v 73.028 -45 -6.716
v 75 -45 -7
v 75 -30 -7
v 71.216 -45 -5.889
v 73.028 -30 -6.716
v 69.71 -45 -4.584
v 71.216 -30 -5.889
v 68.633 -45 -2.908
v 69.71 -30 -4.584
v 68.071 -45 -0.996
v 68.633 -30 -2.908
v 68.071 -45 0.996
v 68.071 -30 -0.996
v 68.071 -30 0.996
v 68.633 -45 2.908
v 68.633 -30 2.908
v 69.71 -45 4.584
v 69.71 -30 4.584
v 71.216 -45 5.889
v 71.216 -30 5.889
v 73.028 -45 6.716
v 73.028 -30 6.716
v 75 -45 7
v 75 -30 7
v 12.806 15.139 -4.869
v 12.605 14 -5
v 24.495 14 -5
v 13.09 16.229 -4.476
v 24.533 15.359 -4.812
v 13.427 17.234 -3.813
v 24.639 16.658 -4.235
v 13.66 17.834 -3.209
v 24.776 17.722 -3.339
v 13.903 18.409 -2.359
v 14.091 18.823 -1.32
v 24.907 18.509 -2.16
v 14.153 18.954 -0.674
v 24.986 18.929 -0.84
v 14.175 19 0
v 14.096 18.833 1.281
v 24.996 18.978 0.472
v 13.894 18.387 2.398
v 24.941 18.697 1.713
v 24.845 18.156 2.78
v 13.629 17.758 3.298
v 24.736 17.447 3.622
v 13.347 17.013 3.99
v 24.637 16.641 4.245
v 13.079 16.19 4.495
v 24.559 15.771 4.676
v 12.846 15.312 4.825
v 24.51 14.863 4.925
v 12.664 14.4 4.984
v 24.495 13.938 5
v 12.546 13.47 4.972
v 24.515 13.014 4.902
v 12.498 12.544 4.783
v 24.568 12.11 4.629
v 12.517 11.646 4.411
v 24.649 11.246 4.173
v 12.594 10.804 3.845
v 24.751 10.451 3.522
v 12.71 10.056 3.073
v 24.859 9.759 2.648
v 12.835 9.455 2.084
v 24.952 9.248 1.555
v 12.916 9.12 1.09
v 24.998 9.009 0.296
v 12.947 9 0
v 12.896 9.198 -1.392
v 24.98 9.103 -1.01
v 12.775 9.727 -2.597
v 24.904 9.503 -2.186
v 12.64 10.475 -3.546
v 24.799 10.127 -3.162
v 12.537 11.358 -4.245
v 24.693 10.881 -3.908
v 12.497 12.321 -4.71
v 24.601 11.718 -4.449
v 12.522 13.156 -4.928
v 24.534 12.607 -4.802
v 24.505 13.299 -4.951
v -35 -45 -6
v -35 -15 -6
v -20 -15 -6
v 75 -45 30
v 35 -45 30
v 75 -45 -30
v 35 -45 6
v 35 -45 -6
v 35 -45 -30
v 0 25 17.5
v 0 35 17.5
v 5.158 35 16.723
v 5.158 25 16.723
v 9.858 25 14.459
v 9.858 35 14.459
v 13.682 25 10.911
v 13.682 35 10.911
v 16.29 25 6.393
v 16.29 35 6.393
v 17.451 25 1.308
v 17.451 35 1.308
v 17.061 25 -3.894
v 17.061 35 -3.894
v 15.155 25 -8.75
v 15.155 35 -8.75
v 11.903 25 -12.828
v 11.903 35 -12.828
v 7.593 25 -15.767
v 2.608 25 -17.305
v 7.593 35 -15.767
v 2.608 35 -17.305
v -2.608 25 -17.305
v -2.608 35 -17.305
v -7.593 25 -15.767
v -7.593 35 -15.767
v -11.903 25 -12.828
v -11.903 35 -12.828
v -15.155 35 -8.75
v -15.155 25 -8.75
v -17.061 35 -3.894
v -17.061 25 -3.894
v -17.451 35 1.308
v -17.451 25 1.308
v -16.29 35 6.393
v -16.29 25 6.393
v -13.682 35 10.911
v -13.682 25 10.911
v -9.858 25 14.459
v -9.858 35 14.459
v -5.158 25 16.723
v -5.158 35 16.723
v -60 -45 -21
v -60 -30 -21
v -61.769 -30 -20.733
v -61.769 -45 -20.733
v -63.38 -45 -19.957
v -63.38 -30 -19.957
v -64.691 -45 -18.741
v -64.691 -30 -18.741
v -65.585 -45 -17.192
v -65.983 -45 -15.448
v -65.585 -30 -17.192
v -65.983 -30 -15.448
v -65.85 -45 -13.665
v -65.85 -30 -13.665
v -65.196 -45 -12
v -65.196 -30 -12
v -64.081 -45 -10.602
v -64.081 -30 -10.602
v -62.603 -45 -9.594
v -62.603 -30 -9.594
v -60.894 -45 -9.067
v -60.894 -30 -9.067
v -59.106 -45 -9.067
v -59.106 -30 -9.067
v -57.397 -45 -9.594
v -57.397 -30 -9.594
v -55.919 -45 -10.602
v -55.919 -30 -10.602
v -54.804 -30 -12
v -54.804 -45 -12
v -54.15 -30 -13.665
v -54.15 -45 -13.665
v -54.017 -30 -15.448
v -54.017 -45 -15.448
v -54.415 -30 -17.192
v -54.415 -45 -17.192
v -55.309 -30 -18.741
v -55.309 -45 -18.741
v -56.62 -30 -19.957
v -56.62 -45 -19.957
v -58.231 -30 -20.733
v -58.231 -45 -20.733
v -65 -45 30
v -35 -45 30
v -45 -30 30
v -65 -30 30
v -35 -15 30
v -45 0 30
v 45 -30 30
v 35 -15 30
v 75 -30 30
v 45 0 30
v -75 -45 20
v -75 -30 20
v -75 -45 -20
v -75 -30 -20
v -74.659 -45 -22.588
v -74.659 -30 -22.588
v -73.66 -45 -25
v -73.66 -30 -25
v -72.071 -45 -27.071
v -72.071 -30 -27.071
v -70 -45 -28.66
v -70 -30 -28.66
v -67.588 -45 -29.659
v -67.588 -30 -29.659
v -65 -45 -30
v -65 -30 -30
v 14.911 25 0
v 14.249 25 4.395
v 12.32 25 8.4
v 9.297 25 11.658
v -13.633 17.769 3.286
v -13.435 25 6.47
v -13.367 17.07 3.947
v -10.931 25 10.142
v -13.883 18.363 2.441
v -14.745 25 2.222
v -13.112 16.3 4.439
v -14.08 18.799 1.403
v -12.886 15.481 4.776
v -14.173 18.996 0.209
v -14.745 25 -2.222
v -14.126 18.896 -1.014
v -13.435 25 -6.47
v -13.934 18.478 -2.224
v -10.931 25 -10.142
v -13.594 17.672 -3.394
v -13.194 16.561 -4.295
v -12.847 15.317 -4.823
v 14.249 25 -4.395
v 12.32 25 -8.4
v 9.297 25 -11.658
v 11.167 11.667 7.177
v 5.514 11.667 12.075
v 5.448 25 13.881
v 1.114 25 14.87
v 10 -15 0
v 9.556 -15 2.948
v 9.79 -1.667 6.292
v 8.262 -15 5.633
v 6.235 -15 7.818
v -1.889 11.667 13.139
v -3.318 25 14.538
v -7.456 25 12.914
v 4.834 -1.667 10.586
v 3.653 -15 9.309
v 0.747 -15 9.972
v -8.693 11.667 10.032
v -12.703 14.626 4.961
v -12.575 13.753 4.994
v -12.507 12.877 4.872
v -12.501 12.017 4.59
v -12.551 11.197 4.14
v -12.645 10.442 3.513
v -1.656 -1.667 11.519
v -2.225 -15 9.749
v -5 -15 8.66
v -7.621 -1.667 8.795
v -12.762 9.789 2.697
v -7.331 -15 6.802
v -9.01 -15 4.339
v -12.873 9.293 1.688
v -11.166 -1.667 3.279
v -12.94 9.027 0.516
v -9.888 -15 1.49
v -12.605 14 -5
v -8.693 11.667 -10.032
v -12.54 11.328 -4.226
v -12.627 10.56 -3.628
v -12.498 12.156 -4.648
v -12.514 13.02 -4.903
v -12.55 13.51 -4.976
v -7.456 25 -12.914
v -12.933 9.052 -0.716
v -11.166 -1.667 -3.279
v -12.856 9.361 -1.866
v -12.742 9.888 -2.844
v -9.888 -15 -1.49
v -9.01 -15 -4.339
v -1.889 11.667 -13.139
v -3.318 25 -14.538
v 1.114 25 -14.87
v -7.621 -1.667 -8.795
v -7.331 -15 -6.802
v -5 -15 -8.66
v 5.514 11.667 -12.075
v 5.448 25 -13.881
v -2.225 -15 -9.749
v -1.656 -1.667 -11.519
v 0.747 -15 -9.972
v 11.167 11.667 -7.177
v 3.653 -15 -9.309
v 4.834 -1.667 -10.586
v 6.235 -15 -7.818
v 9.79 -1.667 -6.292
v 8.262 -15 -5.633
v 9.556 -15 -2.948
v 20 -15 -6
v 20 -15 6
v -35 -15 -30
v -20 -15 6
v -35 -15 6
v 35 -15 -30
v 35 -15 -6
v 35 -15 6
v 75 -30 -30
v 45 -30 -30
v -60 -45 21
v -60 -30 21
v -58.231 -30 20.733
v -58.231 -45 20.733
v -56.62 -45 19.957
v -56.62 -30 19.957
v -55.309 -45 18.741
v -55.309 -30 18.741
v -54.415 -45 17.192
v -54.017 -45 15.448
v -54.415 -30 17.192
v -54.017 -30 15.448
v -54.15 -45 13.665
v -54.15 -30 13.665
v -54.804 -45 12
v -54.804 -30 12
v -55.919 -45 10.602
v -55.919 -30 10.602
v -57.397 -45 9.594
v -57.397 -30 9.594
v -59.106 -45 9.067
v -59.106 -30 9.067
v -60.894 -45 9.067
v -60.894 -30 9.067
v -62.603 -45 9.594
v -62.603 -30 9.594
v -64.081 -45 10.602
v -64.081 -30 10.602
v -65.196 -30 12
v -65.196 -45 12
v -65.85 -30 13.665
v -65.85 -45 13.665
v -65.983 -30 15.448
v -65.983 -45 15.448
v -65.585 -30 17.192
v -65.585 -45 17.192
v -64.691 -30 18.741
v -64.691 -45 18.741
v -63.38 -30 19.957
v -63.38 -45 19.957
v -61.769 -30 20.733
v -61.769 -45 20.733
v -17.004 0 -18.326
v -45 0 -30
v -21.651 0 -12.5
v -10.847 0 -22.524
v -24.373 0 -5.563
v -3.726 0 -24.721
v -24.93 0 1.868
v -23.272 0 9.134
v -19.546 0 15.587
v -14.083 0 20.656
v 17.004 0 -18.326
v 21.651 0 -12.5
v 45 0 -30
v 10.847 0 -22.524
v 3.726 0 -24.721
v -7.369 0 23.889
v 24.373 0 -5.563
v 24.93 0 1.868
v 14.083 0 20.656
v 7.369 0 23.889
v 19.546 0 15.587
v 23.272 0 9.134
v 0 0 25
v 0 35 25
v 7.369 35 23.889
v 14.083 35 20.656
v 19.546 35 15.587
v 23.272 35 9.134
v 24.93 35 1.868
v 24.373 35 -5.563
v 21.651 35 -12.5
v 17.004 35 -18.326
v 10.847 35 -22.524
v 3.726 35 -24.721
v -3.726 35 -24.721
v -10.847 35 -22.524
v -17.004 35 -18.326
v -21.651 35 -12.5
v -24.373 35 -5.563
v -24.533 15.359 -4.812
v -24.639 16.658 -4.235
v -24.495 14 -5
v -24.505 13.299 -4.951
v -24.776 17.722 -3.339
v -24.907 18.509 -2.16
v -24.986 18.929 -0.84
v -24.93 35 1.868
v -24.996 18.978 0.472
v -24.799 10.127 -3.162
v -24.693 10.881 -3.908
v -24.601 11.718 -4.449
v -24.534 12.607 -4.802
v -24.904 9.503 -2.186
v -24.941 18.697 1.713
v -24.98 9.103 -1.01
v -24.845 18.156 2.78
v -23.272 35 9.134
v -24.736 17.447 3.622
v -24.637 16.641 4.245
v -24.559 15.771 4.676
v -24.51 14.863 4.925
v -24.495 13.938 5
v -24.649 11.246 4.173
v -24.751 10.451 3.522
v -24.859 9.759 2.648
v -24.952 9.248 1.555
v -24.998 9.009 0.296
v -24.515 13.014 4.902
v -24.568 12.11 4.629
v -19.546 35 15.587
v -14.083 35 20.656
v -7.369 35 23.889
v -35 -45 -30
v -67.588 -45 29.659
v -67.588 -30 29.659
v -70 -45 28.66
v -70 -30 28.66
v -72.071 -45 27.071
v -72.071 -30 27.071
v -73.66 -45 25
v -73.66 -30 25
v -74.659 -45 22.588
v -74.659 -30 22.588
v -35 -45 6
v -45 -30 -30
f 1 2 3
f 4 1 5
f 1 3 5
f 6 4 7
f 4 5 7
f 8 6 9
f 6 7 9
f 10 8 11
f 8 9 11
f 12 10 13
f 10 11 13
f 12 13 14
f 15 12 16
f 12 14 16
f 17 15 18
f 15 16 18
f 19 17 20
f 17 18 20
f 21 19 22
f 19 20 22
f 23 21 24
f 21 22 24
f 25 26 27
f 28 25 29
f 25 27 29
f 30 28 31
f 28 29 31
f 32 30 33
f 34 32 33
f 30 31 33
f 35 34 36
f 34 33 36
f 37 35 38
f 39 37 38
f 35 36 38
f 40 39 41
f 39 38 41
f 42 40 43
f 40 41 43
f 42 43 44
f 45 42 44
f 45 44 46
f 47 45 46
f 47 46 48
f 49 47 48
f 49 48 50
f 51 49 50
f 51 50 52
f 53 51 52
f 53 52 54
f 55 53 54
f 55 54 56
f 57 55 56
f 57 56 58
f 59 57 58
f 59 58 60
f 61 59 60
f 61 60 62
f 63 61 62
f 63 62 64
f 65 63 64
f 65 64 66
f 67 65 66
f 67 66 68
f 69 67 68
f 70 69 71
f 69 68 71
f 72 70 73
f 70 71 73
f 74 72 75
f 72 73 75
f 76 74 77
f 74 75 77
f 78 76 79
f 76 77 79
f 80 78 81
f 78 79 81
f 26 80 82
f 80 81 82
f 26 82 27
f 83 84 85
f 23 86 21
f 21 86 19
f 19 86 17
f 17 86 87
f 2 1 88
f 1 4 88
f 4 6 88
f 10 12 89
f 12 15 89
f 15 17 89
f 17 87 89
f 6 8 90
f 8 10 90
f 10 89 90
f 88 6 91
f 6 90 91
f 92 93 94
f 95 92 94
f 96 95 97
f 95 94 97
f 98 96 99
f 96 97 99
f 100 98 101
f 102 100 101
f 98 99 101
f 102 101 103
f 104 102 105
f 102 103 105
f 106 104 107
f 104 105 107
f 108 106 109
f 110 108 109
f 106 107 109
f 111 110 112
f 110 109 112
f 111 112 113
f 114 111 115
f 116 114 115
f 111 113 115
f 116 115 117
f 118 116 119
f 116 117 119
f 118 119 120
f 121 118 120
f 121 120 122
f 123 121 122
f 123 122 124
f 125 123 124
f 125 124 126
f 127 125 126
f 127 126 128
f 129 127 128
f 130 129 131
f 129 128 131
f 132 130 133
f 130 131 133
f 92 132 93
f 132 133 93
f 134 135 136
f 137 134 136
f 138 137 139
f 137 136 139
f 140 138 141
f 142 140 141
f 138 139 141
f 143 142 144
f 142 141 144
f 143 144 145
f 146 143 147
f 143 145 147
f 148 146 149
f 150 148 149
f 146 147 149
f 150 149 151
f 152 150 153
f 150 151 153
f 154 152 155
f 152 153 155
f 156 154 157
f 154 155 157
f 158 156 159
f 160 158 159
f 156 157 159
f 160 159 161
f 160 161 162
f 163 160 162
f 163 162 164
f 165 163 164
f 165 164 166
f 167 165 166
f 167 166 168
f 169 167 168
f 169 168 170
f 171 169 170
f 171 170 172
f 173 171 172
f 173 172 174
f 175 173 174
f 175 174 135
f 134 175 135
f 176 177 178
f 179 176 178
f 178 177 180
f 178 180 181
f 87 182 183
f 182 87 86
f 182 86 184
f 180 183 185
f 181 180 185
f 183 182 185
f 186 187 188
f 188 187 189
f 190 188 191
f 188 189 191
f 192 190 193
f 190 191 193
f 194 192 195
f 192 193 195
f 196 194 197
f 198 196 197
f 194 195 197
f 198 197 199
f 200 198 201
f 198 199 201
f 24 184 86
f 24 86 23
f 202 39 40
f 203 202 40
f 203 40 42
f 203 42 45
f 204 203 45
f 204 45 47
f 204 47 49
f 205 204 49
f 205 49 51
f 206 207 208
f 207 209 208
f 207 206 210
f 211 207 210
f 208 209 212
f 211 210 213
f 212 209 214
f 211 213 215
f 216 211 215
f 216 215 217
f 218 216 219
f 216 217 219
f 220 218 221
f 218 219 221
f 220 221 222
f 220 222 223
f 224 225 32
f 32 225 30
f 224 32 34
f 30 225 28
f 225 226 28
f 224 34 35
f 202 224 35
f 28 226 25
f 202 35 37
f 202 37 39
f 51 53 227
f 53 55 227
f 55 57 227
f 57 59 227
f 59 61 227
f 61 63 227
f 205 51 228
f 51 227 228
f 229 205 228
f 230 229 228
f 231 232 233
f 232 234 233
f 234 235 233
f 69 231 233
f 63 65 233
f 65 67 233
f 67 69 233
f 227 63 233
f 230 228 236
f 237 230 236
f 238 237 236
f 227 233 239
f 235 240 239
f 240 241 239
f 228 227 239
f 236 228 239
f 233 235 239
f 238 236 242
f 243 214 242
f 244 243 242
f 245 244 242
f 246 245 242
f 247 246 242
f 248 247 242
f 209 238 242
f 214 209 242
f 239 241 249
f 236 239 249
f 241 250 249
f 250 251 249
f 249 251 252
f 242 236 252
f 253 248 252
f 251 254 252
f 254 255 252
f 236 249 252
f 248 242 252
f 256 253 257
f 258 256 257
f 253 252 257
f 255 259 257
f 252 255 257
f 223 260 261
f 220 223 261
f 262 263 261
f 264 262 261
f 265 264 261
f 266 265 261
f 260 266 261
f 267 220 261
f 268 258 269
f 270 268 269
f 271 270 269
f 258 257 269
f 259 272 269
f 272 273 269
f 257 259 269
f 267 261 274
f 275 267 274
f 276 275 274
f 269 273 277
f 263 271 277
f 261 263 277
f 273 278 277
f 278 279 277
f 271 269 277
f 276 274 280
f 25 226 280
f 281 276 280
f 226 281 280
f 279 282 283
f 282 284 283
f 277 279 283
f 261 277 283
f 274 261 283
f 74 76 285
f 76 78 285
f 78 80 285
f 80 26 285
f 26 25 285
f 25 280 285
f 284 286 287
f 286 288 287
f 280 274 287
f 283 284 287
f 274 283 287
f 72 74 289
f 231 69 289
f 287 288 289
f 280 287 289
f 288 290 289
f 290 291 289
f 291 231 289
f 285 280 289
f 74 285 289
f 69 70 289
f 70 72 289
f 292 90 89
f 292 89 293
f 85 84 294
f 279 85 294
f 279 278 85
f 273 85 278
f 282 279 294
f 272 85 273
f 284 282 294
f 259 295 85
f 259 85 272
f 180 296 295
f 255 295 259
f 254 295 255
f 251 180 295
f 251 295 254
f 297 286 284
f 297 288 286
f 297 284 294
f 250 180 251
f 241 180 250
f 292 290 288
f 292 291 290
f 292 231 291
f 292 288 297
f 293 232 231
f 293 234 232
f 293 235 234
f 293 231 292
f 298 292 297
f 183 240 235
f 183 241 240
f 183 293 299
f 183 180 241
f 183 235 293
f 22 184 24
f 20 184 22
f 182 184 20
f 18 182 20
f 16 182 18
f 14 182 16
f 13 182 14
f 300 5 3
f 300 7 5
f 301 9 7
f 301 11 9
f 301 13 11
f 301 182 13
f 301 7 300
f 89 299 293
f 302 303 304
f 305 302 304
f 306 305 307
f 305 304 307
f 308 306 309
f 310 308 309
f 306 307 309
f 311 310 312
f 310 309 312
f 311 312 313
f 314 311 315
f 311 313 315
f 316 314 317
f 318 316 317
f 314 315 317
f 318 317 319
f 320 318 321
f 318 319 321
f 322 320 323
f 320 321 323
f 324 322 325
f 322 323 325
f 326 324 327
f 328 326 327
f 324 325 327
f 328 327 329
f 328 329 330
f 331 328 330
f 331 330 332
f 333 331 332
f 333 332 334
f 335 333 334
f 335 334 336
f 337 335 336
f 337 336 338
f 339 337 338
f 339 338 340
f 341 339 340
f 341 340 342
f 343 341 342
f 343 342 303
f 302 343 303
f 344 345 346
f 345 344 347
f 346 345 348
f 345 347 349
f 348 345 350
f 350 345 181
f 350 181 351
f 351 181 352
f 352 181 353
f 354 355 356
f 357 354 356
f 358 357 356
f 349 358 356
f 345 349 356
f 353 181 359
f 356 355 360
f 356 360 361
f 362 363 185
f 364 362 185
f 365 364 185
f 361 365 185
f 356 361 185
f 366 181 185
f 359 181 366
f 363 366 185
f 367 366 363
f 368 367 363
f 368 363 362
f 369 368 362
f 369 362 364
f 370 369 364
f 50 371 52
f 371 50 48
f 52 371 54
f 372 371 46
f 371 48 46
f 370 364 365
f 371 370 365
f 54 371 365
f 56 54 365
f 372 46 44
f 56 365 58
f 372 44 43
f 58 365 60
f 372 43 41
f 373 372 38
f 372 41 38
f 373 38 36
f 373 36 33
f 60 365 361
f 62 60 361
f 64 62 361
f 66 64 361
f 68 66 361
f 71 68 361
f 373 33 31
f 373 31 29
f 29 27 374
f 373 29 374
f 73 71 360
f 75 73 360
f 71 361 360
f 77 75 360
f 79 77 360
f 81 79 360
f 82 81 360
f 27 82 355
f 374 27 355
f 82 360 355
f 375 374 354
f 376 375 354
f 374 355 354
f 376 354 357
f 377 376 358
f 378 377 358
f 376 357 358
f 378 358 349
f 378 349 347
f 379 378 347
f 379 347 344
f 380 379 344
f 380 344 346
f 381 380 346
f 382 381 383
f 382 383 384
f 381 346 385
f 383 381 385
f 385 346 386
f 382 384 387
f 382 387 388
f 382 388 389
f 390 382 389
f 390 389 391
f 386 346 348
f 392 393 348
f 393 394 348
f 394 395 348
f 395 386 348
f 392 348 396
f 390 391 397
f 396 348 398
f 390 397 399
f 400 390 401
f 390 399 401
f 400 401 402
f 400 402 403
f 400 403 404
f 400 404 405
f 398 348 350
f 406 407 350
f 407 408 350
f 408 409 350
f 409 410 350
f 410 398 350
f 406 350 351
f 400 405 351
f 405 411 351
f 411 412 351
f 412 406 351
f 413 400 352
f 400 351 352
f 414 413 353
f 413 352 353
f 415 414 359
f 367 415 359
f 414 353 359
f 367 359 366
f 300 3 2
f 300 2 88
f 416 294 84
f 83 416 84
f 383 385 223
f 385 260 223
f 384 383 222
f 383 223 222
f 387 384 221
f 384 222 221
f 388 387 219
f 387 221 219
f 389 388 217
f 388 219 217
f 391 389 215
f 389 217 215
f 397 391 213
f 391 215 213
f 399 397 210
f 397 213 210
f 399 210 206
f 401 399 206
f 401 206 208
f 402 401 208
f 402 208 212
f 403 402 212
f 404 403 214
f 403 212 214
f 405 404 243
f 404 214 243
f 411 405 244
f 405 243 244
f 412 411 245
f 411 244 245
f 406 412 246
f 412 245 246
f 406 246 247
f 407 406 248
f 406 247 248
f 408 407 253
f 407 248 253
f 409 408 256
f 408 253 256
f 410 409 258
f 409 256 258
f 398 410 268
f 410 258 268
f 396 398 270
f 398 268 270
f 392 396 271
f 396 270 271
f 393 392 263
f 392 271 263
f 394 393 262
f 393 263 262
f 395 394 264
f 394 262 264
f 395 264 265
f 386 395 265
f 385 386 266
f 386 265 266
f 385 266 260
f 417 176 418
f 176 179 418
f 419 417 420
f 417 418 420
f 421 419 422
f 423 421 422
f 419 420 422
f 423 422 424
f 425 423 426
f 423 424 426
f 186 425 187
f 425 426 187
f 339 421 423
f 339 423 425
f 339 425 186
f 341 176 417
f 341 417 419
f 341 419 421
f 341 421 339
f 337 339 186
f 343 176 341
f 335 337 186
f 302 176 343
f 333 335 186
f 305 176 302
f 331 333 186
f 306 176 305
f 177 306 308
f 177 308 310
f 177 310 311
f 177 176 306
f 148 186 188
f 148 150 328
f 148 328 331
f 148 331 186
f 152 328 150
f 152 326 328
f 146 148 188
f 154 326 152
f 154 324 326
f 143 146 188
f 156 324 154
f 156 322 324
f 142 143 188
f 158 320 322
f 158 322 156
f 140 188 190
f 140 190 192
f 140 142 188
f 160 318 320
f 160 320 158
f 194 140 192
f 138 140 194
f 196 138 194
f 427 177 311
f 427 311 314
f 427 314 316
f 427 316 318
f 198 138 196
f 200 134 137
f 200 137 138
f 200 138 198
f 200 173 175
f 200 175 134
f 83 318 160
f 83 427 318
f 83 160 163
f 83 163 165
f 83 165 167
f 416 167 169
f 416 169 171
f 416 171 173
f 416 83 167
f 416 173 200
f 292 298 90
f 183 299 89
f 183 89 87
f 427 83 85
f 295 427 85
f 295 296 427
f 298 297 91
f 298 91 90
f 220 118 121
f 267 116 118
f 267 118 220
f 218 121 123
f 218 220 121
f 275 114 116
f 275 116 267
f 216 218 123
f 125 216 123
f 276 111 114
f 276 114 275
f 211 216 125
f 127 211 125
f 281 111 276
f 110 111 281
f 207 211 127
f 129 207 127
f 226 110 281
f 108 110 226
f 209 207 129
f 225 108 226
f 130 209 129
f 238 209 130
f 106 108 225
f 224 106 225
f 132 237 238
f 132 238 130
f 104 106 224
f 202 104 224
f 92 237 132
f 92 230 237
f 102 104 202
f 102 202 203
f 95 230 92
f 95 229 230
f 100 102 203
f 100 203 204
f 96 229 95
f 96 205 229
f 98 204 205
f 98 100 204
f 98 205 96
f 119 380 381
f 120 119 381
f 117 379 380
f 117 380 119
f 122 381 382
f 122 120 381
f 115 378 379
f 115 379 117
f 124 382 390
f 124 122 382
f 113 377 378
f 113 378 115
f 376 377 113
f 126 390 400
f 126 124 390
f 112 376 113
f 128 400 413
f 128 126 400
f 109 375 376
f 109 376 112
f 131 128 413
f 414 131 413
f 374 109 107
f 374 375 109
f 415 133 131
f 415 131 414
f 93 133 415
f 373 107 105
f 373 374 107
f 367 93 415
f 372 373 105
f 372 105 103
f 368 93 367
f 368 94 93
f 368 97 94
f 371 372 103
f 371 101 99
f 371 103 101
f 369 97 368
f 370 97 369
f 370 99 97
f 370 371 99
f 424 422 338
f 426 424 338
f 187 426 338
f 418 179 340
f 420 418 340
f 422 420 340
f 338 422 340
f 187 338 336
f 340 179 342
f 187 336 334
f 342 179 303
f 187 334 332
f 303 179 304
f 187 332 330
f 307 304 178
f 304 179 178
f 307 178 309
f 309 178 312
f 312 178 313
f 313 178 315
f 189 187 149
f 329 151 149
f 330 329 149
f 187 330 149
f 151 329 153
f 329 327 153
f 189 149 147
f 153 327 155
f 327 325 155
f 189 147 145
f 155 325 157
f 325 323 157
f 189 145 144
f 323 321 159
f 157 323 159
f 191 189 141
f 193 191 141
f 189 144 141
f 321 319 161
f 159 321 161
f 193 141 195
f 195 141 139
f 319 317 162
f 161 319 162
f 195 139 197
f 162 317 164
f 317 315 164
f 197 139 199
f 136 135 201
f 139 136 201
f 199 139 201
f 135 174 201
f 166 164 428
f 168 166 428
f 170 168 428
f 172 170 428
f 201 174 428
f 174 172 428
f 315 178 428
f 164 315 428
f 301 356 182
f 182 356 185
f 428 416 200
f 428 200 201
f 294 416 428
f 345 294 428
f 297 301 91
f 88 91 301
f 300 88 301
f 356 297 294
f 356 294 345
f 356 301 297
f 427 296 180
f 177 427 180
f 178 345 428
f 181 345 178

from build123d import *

# Parameters (mm, degrees)
SKETCH1_R           = 25
BOSS_EXTRUDE1_DEPTH = 35
SKETCH2_R           = 17.5
CUT_EXTRUDE1_DEPTH  = 10
SKETCH7_W           = 90
SKETCH7_H           = 60
BOSS_EXTRUDE3_DEPTH = 15
SKETCH8_R           = 10
CUT_EXTRUDE4_DEPTH  = 40
CUT_EXTRUDE4_DRAFT  = 7
SKETCH9_W           = 10
SKETCH9_H           = 60
BOSS_EXTRUDE4_DEPTH = 30
SKETCH11_R          = 5
CUT_EXTRUDE5_DEPTH  = 35
SKETCH12_W          = 60
SKETCH12_H          = 15
BOSS_EXTRUDE5_DEPTH = 30
RIB1_START          = -6
RIB1_DEPTH          = 12
SKETCH16_R          = 6
CUT_EXTRUDE6_DEPTH  = 30
FILLET1_R           = 10
SKETCH17_R          = 7
CUT_EXTRUDE7_DEPTH  = 30


# Read off the part's stored shape, not the designer's step: Rib1
with BuildPart() as part:
    # Sketch1 → Boss-Extrude1 (new body)
    with BuildSketch(Plane(origin=(0, 0, 0), x_dir=(1, 0, 0), z_dir=(0, 1, 0))):
        with Locations(Location((0, 0, 0), (0, 0, 270))):
            Circle(SKETCH1_R)
    extrude(amount=BOSS_EXTRUDE1_DEPTH)

    # Sketch2 → Cut-Extrude1 (cut)
    with BuildSketch(Plane(origin=(0, 35, 0), x_dir=(1, 0, 0), z_dir=(0, 1, 0))):
        with Locations(Location((0, 0, 0), (0, 0, 270))):
            Circle(SKETCH2_R)
    extrude(amount=-CUT_EXTRUDE1_DEPTH, mode=Mode.SUBTRACT)

    # Sketch7 → Boss-Extrude3 (add)
    with BuildSketch(Plane.XZ):
        Rectangle(SKETCH7_W, SKETCH7_H)
    extrude(amount=BOSS_EXTRUDE3_DEPTH)


with BuildPart() as cut_extrude4_tool:
    # Sketch8 → Cut-Extrude4 (with draft: the straight prism first)
    with BuildSketch(Plane.XZ.offset(15)):
        Circle(SKETCH8_R)
    extrude(amount=-CUT_EXTRUDE4_DEPTH)
    # Cut-Extrude4: the draft: its side faces are tilted about the plane it starts from
    cut_extrude4_sides = [cut_extrude4_tool.faces().sort_by_distance(p)[0] for p in [
        (-10, 5, 0),
    ]]
    draft(cut_extrude4_sides, Plane.XZ.offset(15), CUT_EXTRUDE4_DRAFT)


with BuildPart() as part_1:
    add(part.part)

    # Cut-Extrude4: cut by cut_extrude4_tool
    add(cut_extrude4_tool.part, mode=Mode.SUBTRACT)

    # Sketch9 → Boss-Extrude4 (add)
    with BuildSketch(Plane.XZ.offset(15)):
        with Locations((-40, 0)):
            Rectangle(SKETCH9_W, SKETCH9_H)
        with Locations((40, 0)):
            Rectangle(SKETCH9_W, SKETCH9_H)
    extrude(amount=BOSS_EXTRUDE4_DEPTH)

    # Sketch11 → Cut-Extrude5 (cut, symmetric)
    with BuildSketch(Plane(origin=(0, 0, 0), x_dir=(0, 0, -1), z_dir=(1, 0, 0))):
        with Locations((0, 14)):
            Circle(SKETCH11_R)
    extrude(amount=CUT_EXTRUDE5_DEPTH, both=True, mode=Mode.SUBTRACT)

    # Sketch12 → Boss-Extrude5 (add)
    with BuildSketch(Plane(origin=(45, 0, 0), x_dir=(0, 0, -1), z_dir=(1, 0, 0))):
        with Locations((0, -37.5)):
            Rectangle(SKETCH12_W, SKETCH12_H)
    boss_extrude5 = extrude(amount=BOSS_EXTRUDE5_DEPTH)

    # Mirror1: Boss-Extrude5 across plane
    add(boss_extrude5.mirror(Plane(origin=(0, 0, 0), x_dir=(0, 0, 1), z_dir=(1, 0, 0))))

    # Rib1 outline → Rib1 (add)
    with BuildSketch(Plane.XY.offset(RIB1_START)):
        Polygon((-35, -15), (-35, -45), (-20, -15), align=None)
    rib1 = extrude(amount=RIB1_DEPTH)

    # Mirror2: Rib1 across plane
    add(rib1.mirror(Plane(origin=(0, 0, 0), x_dir=(0, 0, 1), z_dir=(1, 0, 0))))

    # Sketch16 → Cut-Extrude6 (cut)
    with BuildSketch(Plane(origin=(0, -30, 0), x_dir=(1, 0, 0), z_dir=(0, 1, 0))):
        with Locations(Location((-60, -15, 0), (0, 0, 270))):
            Circle(SKETCH16_R)
        with Locations(Location((-60, 15, 0), (0, 0, 90))):
            Circle(SKETCH16_R)
    extrude(amount=-CUT_EXTRUDE6_DEPTH, mode=Mode.SUBTRACT)

    # Fillet1
    fillet1_edges = [part_1.edges().sort_by_distance(p)[0] for p in [
        (-75, -37.5, 30),
        (-75, -37.5, -30),
    ]]
    fillet(fillet1_edges, radius=FILLET1_R)

    # Sketch17 → Cut-Extrude7 (cut)
    with BuildSketch(Plane(origin=(0, -30, 0), x_dir=(1, 0, 0), z_dir=(0, 1, 0))):
        with Locations((75, 0)):
            Circle(SKETCH17_R)
    extrude(amount=-CUT_EXTRUDE7_DEPTH, mode=Mode.SUBTRACT)


solid = part_1.part
